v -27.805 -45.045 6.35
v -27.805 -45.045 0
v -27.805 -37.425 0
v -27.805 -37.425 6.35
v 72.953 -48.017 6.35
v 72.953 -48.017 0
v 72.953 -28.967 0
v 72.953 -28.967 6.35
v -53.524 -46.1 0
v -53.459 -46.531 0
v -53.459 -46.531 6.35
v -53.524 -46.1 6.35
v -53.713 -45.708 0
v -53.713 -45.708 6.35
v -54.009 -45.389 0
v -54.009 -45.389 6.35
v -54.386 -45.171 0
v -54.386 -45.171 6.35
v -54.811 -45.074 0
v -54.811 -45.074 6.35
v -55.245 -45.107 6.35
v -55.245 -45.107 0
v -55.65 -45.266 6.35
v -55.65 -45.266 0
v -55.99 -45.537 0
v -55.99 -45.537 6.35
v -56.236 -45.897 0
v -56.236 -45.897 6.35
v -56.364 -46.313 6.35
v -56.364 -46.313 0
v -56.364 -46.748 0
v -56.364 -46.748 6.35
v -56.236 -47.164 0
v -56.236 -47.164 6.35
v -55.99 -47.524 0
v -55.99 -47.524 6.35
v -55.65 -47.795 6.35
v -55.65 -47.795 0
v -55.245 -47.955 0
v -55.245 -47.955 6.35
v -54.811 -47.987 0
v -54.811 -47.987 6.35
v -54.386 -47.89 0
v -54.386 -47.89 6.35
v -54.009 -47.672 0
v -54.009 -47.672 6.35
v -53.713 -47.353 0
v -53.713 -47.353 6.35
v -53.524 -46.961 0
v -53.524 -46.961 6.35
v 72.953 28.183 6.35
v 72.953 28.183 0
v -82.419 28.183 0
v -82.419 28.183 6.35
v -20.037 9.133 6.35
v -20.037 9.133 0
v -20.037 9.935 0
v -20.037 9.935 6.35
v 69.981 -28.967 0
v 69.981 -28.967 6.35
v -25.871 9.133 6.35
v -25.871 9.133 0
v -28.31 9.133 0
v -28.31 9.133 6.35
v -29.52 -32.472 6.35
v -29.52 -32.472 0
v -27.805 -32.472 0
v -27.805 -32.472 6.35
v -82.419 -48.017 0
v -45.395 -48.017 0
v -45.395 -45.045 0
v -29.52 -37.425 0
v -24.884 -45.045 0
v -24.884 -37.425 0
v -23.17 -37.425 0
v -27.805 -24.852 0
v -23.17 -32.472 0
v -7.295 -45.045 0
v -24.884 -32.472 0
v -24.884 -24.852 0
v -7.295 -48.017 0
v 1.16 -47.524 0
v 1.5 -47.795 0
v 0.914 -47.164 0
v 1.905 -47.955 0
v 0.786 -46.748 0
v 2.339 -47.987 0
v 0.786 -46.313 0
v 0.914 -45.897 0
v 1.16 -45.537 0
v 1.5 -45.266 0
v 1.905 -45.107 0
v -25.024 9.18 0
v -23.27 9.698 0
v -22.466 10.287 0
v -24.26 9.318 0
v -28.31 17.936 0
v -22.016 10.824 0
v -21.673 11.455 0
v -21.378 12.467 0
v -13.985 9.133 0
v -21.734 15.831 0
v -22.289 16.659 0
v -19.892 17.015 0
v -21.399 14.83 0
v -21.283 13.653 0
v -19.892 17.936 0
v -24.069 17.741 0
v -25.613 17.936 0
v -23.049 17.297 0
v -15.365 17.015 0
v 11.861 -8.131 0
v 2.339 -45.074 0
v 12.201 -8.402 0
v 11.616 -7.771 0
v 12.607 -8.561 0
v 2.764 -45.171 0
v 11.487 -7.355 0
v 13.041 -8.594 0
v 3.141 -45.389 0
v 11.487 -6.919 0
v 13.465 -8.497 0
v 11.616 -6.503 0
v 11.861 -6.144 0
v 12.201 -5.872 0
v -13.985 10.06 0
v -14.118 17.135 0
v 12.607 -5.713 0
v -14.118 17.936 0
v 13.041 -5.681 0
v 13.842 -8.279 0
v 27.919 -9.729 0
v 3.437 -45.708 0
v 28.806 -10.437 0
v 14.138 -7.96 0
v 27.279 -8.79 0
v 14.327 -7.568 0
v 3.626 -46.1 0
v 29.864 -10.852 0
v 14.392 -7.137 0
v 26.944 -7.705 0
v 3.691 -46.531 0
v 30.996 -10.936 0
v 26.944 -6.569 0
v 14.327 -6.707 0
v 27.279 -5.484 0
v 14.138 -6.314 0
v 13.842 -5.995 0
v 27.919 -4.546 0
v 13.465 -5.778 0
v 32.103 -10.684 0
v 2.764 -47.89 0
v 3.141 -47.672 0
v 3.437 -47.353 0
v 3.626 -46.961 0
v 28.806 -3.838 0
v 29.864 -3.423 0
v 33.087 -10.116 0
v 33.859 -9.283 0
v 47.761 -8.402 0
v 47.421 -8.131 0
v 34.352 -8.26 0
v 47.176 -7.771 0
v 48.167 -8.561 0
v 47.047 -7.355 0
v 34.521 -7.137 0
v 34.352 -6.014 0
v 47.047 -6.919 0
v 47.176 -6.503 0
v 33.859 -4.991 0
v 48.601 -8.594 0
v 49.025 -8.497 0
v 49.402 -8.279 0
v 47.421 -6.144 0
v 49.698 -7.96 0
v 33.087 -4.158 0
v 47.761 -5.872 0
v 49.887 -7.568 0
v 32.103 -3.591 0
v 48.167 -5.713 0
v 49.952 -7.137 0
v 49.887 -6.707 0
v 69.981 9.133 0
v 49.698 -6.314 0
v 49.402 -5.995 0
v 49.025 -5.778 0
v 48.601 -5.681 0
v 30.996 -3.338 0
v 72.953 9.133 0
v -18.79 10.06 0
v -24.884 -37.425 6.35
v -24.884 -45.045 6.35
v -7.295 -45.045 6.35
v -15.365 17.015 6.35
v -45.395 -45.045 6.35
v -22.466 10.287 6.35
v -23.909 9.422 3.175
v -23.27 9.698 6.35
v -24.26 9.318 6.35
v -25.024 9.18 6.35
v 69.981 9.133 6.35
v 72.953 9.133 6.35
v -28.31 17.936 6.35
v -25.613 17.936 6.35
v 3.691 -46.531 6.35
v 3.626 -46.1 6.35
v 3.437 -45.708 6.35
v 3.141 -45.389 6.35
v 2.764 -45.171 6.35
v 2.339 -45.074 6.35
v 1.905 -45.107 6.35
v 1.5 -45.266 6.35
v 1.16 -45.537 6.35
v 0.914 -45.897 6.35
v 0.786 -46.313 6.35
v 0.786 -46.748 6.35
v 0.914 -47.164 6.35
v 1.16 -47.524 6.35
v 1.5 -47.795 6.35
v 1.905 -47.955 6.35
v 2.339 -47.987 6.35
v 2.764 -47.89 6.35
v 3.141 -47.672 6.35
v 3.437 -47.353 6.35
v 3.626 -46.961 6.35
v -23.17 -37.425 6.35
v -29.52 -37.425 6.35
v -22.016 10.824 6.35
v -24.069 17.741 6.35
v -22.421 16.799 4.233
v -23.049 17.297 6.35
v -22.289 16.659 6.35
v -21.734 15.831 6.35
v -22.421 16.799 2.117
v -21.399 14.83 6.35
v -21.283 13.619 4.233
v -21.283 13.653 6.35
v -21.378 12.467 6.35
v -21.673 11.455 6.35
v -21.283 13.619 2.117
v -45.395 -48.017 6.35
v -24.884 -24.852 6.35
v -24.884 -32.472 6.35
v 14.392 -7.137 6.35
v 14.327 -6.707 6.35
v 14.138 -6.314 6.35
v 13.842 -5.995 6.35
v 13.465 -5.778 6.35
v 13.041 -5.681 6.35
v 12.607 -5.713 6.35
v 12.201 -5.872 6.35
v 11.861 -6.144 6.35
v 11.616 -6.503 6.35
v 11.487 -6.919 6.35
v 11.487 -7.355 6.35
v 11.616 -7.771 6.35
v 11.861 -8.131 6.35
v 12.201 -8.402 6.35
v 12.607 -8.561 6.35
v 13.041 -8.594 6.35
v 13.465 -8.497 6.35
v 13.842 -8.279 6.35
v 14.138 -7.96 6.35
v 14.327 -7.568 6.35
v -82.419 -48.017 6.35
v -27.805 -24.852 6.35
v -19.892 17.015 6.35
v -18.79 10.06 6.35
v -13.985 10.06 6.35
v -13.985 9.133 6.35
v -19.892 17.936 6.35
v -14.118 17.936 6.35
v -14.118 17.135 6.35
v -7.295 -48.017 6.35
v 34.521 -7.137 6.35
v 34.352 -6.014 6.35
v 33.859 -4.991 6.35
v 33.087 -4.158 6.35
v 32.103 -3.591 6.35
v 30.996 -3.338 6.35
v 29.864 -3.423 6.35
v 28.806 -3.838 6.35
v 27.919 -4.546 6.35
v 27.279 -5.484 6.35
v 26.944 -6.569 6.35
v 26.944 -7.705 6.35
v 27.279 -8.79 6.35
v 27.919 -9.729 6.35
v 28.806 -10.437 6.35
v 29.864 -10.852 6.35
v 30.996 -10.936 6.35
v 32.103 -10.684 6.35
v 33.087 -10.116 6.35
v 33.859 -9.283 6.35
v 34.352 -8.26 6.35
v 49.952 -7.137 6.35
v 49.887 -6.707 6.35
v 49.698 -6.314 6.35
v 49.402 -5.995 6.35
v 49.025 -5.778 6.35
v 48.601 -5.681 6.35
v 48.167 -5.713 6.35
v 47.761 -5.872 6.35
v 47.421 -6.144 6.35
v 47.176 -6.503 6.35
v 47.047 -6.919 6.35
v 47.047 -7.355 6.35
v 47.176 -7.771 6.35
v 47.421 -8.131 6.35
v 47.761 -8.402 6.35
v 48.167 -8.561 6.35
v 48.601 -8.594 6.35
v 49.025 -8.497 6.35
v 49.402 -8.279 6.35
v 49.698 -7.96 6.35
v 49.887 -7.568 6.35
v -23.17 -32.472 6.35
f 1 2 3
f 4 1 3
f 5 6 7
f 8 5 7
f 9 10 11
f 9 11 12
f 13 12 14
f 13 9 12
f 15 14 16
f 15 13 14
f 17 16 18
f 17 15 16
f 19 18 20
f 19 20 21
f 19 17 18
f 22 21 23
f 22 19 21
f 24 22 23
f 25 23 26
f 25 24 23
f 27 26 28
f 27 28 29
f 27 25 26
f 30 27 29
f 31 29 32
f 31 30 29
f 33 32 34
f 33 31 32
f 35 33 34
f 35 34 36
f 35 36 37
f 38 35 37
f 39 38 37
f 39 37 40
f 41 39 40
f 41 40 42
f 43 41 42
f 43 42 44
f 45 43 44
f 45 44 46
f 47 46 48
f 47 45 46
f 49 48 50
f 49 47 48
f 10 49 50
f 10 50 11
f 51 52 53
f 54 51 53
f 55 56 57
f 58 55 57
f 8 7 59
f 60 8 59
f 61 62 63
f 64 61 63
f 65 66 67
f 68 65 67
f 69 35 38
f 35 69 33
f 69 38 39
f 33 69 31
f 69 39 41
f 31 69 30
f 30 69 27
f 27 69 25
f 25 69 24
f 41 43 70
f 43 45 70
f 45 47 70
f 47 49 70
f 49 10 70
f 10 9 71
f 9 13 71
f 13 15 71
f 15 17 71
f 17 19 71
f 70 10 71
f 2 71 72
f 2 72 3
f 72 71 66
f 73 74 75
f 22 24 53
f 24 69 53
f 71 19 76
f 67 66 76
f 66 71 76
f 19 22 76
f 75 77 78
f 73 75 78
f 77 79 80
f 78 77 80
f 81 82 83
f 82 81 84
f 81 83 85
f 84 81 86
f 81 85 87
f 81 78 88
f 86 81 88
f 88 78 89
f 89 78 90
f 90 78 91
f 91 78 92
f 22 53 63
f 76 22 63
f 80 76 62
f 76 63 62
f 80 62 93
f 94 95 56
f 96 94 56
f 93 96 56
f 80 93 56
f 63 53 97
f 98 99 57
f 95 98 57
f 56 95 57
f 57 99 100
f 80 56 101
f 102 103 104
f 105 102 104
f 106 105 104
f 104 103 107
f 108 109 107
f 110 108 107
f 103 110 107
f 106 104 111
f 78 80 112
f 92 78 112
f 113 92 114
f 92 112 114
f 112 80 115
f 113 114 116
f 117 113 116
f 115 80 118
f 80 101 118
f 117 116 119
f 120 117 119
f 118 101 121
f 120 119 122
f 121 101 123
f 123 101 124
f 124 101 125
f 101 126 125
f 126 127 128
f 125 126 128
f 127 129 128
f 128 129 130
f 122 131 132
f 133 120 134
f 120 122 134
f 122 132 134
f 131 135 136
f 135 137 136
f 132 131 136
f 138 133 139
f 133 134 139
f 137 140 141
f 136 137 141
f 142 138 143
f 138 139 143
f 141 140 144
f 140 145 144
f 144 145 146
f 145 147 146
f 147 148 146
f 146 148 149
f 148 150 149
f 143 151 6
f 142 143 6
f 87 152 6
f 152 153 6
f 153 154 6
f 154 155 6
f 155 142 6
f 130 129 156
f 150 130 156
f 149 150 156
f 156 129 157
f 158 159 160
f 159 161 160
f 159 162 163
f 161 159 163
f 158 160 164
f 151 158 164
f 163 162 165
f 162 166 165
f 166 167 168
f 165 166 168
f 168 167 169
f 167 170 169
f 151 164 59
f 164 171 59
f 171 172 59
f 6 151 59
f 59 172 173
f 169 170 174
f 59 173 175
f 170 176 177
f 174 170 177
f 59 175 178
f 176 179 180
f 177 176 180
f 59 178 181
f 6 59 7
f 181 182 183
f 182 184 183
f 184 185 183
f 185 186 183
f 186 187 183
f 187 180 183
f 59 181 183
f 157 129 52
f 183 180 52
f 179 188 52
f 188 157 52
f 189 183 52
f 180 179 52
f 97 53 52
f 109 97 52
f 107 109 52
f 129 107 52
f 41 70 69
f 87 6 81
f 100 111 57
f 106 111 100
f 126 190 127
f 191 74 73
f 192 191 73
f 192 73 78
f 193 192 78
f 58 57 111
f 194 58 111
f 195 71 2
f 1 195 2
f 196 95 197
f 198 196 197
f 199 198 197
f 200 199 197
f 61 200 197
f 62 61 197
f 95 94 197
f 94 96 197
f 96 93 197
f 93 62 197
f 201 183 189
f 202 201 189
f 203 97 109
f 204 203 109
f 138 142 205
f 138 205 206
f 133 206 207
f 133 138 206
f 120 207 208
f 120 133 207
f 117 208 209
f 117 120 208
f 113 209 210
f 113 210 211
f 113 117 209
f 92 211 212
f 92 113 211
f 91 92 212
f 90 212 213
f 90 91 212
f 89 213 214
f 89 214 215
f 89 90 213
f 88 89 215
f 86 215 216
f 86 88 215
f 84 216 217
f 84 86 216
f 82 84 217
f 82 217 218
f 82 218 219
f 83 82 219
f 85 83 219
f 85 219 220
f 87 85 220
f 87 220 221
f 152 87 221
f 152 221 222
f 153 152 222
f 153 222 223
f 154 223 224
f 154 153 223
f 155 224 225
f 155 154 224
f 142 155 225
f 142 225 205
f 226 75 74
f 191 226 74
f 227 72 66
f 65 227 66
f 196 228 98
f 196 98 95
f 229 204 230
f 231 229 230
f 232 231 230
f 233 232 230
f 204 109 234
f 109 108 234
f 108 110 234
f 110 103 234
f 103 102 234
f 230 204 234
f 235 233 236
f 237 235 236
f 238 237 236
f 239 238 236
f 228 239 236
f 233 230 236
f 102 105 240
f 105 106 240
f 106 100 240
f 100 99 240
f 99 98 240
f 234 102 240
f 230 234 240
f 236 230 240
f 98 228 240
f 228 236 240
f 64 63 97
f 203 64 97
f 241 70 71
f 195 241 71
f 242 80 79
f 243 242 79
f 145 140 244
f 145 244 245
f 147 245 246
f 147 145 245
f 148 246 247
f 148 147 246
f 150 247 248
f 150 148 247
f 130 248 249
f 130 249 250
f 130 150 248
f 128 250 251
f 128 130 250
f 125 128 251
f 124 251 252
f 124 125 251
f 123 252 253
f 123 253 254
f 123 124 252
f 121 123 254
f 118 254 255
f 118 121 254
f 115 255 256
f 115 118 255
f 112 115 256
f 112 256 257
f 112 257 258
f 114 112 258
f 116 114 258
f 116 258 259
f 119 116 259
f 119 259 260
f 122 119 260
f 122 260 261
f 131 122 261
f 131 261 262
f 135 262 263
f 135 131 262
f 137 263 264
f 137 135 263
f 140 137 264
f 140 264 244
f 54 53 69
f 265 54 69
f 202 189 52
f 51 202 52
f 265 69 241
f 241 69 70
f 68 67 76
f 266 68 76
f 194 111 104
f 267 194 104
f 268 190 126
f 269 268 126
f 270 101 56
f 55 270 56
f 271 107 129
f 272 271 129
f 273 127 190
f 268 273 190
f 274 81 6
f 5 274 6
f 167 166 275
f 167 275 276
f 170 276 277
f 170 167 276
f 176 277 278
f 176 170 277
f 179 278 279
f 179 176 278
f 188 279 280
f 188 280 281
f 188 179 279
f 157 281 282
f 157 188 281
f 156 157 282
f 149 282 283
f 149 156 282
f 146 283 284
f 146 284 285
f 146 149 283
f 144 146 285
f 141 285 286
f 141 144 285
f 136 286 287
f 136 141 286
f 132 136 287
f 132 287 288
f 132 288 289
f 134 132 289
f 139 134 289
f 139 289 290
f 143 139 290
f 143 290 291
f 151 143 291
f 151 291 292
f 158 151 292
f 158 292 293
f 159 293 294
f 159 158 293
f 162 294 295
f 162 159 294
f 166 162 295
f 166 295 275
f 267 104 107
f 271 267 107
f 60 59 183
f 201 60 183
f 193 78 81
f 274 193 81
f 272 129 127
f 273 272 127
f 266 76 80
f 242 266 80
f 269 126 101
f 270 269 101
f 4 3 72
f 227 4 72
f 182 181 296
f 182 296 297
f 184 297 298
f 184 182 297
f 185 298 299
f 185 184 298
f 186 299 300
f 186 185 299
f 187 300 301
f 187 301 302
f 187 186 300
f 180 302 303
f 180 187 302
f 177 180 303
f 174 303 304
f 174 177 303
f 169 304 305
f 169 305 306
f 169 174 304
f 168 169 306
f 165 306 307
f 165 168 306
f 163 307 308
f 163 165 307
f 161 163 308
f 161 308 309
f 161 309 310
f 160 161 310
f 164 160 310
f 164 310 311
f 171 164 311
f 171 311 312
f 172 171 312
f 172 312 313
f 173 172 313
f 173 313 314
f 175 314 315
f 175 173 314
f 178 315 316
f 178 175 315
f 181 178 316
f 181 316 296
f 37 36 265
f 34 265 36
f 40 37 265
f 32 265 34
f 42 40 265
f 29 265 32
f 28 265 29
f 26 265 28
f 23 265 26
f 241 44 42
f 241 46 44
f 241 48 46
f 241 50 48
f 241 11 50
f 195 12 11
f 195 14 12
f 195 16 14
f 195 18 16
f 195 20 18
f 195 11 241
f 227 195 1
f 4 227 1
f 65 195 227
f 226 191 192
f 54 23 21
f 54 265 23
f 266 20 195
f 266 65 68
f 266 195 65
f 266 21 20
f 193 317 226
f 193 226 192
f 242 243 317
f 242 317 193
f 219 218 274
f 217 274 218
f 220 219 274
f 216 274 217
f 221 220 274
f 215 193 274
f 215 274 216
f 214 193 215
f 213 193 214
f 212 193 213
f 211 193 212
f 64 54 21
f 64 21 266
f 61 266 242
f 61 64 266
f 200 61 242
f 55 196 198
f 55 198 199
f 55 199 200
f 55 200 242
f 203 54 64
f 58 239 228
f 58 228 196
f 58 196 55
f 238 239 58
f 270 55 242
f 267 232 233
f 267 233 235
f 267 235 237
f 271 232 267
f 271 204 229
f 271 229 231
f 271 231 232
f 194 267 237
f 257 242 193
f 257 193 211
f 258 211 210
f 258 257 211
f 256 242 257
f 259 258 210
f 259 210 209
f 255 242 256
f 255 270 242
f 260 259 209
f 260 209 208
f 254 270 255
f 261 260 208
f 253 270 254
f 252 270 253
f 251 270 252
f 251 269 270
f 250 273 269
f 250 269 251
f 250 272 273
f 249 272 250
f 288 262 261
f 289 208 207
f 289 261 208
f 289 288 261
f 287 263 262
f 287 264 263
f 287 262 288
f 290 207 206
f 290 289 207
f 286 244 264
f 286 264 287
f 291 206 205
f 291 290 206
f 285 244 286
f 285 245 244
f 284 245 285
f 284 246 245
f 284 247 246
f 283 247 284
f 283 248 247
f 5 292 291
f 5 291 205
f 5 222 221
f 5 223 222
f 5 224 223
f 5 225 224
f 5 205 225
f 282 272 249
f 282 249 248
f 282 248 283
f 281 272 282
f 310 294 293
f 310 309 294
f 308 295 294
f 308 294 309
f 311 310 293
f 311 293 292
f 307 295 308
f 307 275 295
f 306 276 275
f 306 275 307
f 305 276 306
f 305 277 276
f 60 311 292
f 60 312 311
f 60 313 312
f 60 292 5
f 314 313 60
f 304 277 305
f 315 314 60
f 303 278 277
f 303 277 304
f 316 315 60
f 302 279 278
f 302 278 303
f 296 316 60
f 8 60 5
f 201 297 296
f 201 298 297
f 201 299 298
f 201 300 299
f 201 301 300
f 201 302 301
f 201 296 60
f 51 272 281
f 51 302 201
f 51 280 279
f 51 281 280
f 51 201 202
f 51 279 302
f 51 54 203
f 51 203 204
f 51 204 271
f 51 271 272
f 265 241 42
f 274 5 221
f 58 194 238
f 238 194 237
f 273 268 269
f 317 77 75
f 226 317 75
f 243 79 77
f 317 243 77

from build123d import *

# Parameters (mm, degrees)
F0_R     = 1.4605
F0_R_2   = 3.81
F1_DEPTH = 6.35


# Not quite as in the source:
# - a feature names something its author has since deleted; it is built from what else it names


with BuildPart() as f1:
    # F0 (on Top) → F1 (new body)
    with BuildSketch(Plane.XY):
        Polygon((72.9530500723, 9.1334713354), (72.9530500723, 28.1834713354), (-82.4187499277, 28.1834713354), (-82.4187499277, -48.0165286646), (-45.3947193277, -48.0165286646), (-45.3947193277, -45.0447286646), (-27.8052193277, -45.0447286646), (-27.8052193277, -37.4247286646), (-29.5197193277, -37.4247286646), (-29.5197193277, -32.4717286646), (-27.8052193277, -32.4717286646), (-27.8052193277, -24.8517286646), (-26.3447193277, -24.8517286646), (-24.8842193277, -24.8517286646), (-24.8842193277, -32.4717286646), (-23.1697193277, -32.4717286646), (-23.1697193277, -37.4247286646), (-24.8842193277, -37.4247286646), (-24.8842193277, -45.0447286646), (-7.2947193277, -45.0447286646), (-7.2947193277, -48.0165286646), (11.7552806723, -48.0165286646), (72.9530500723, -48.0165286646), (72.9530500723, -28.9665286646), (69.9812500723, -28.9665286646), (69.9812500723, 9.1334713354), align=None)
        with Locations((-54.9197193277, -46.5306286646)):
            Circle(F0_R, mode=Mode.SUBTRACT)
        with Locations((2.2302806723, -46.5306286646)):
            Circle(F0_R, mode=Mode.SUBTRACT)
        with BuildLine():
            add(Edge.make_bspline(
                [(-22.4210550397, 16.7985652577), (-21.283380549, 15.660890767), (-21.283380549, 13.6186639082)],
                knots=[0, 0, 0, 1, 1, 1], degree=2))
            add(Edge.make_bspline(
                [(-21.283380549, 13.6186639082), (-21.283380549, 11.4396463825), (-22.4663308238, 10.2865588589)],
                knots=[0, 0, 0, 1, 1, 1], degree=2))
            add(Edge.make_bspline(
                [(-22.4663308238, 10.2865588589), (-23.6492810986, 9.1334713354), (-25.8706844648, 9.1334713354)],
                knots=[0, 0, 0, 1, 1, 1], degree=2))
            Line((-25.8706844648, 9.1334713354), (-28.3097969206, 9.1334713354))
            Line((-28.3097969206, 9.1334713354), (-28.3097969206, 17.9362397483))
            Line((-28.3097969206, 17.9362397483), (-25.6125161638, 17.9362397483))
            add(Edge.make_bspline(
                [(-25.6125161638, 17.9362397483), (-23.5587295303, 17.9362397483), (-22.4210550397, 16.7985652577)],
                knots=[0, 0, 0, 1, 1, 1], degree=2))
        make_face(mode=Mode.SUBTRACT)
        Polygon((-13.9853094725, 10.0601799383), (-13.9853094725, 9.1334713354), (-20.0368515135, 9.1334713354), (-20.0368515135, 9.934949046), (-15.3647759168, 17.0153110328), (-19.8923543301, 17.0153110328), (-19.8923543301, 17.9362397483), (-14.1182468813, 17.9362397483), (-14.1182468813, 17.1347620377), (-18.790322478, 10.0601799383), align=None, mode=Mode.SUBTRACT)
        with Locations((12.9314999741, -7.1371421218)):
            Circle(F0_R, mode=Mode.SUBTRACT)
        with Locations((30.7114999741, -7.1371421218)):
            Circle(F0_R_2, mode=Mode.SUBTRACT)
        with Locations((48.4914999741, -7.1371421218)):
            Circle(F0_R, mode=Mode.SUBTRACT)
    extrude(amount=F1_DEPTH)


solid = f1.part
